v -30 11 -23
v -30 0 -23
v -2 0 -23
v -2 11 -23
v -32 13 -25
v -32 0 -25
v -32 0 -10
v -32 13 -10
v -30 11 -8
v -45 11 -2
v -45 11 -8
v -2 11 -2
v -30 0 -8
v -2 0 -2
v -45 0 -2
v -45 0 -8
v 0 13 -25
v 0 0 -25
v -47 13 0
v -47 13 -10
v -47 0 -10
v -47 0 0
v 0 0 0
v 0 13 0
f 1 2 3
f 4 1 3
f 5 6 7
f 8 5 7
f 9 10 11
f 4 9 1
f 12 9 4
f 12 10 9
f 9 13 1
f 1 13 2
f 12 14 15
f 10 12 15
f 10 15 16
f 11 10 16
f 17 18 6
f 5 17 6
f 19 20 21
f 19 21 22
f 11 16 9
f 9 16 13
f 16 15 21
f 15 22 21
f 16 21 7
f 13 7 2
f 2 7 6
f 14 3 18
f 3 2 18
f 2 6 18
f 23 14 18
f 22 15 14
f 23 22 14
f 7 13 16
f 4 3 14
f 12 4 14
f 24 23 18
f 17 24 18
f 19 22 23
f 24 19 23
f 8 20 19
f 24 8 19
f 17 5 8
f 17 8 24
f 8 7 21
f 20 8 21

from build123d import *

# Parameters (mm, degrees)
EXTRUDE_1_DEPTH     = 13
CUT_EXTRUDE_1_DEPTH = 11


with BuildPart() as part:
    # 草图1 → 凸台-拉伸1 (new body)
    with BuildSketch(Plane(origin=(0, 0, 0), x_dir=(1, 0, 0), z_dir=(0, 1, 0))):
        Polygon((0, 0), (0, 25), (-32, 25), (-32, 10), (-47, 10), (-47, 0), align=None)
    extrude(amount=EXTRUDE_1_DEPTH)

    # 草图2 → 切除-拉伸1 (cut)
    with BuildSketch(Plane.XZ):
        Polygon((-2, -2), (-45, -2), (-45, -8), (-30, -8), (-30, -23), (-2, -23), align=None)
    extrude(amount=-CUT_EXTRUDE_1_DEPTH, mode=Mode.SUBTRACT)


solid = part.part
